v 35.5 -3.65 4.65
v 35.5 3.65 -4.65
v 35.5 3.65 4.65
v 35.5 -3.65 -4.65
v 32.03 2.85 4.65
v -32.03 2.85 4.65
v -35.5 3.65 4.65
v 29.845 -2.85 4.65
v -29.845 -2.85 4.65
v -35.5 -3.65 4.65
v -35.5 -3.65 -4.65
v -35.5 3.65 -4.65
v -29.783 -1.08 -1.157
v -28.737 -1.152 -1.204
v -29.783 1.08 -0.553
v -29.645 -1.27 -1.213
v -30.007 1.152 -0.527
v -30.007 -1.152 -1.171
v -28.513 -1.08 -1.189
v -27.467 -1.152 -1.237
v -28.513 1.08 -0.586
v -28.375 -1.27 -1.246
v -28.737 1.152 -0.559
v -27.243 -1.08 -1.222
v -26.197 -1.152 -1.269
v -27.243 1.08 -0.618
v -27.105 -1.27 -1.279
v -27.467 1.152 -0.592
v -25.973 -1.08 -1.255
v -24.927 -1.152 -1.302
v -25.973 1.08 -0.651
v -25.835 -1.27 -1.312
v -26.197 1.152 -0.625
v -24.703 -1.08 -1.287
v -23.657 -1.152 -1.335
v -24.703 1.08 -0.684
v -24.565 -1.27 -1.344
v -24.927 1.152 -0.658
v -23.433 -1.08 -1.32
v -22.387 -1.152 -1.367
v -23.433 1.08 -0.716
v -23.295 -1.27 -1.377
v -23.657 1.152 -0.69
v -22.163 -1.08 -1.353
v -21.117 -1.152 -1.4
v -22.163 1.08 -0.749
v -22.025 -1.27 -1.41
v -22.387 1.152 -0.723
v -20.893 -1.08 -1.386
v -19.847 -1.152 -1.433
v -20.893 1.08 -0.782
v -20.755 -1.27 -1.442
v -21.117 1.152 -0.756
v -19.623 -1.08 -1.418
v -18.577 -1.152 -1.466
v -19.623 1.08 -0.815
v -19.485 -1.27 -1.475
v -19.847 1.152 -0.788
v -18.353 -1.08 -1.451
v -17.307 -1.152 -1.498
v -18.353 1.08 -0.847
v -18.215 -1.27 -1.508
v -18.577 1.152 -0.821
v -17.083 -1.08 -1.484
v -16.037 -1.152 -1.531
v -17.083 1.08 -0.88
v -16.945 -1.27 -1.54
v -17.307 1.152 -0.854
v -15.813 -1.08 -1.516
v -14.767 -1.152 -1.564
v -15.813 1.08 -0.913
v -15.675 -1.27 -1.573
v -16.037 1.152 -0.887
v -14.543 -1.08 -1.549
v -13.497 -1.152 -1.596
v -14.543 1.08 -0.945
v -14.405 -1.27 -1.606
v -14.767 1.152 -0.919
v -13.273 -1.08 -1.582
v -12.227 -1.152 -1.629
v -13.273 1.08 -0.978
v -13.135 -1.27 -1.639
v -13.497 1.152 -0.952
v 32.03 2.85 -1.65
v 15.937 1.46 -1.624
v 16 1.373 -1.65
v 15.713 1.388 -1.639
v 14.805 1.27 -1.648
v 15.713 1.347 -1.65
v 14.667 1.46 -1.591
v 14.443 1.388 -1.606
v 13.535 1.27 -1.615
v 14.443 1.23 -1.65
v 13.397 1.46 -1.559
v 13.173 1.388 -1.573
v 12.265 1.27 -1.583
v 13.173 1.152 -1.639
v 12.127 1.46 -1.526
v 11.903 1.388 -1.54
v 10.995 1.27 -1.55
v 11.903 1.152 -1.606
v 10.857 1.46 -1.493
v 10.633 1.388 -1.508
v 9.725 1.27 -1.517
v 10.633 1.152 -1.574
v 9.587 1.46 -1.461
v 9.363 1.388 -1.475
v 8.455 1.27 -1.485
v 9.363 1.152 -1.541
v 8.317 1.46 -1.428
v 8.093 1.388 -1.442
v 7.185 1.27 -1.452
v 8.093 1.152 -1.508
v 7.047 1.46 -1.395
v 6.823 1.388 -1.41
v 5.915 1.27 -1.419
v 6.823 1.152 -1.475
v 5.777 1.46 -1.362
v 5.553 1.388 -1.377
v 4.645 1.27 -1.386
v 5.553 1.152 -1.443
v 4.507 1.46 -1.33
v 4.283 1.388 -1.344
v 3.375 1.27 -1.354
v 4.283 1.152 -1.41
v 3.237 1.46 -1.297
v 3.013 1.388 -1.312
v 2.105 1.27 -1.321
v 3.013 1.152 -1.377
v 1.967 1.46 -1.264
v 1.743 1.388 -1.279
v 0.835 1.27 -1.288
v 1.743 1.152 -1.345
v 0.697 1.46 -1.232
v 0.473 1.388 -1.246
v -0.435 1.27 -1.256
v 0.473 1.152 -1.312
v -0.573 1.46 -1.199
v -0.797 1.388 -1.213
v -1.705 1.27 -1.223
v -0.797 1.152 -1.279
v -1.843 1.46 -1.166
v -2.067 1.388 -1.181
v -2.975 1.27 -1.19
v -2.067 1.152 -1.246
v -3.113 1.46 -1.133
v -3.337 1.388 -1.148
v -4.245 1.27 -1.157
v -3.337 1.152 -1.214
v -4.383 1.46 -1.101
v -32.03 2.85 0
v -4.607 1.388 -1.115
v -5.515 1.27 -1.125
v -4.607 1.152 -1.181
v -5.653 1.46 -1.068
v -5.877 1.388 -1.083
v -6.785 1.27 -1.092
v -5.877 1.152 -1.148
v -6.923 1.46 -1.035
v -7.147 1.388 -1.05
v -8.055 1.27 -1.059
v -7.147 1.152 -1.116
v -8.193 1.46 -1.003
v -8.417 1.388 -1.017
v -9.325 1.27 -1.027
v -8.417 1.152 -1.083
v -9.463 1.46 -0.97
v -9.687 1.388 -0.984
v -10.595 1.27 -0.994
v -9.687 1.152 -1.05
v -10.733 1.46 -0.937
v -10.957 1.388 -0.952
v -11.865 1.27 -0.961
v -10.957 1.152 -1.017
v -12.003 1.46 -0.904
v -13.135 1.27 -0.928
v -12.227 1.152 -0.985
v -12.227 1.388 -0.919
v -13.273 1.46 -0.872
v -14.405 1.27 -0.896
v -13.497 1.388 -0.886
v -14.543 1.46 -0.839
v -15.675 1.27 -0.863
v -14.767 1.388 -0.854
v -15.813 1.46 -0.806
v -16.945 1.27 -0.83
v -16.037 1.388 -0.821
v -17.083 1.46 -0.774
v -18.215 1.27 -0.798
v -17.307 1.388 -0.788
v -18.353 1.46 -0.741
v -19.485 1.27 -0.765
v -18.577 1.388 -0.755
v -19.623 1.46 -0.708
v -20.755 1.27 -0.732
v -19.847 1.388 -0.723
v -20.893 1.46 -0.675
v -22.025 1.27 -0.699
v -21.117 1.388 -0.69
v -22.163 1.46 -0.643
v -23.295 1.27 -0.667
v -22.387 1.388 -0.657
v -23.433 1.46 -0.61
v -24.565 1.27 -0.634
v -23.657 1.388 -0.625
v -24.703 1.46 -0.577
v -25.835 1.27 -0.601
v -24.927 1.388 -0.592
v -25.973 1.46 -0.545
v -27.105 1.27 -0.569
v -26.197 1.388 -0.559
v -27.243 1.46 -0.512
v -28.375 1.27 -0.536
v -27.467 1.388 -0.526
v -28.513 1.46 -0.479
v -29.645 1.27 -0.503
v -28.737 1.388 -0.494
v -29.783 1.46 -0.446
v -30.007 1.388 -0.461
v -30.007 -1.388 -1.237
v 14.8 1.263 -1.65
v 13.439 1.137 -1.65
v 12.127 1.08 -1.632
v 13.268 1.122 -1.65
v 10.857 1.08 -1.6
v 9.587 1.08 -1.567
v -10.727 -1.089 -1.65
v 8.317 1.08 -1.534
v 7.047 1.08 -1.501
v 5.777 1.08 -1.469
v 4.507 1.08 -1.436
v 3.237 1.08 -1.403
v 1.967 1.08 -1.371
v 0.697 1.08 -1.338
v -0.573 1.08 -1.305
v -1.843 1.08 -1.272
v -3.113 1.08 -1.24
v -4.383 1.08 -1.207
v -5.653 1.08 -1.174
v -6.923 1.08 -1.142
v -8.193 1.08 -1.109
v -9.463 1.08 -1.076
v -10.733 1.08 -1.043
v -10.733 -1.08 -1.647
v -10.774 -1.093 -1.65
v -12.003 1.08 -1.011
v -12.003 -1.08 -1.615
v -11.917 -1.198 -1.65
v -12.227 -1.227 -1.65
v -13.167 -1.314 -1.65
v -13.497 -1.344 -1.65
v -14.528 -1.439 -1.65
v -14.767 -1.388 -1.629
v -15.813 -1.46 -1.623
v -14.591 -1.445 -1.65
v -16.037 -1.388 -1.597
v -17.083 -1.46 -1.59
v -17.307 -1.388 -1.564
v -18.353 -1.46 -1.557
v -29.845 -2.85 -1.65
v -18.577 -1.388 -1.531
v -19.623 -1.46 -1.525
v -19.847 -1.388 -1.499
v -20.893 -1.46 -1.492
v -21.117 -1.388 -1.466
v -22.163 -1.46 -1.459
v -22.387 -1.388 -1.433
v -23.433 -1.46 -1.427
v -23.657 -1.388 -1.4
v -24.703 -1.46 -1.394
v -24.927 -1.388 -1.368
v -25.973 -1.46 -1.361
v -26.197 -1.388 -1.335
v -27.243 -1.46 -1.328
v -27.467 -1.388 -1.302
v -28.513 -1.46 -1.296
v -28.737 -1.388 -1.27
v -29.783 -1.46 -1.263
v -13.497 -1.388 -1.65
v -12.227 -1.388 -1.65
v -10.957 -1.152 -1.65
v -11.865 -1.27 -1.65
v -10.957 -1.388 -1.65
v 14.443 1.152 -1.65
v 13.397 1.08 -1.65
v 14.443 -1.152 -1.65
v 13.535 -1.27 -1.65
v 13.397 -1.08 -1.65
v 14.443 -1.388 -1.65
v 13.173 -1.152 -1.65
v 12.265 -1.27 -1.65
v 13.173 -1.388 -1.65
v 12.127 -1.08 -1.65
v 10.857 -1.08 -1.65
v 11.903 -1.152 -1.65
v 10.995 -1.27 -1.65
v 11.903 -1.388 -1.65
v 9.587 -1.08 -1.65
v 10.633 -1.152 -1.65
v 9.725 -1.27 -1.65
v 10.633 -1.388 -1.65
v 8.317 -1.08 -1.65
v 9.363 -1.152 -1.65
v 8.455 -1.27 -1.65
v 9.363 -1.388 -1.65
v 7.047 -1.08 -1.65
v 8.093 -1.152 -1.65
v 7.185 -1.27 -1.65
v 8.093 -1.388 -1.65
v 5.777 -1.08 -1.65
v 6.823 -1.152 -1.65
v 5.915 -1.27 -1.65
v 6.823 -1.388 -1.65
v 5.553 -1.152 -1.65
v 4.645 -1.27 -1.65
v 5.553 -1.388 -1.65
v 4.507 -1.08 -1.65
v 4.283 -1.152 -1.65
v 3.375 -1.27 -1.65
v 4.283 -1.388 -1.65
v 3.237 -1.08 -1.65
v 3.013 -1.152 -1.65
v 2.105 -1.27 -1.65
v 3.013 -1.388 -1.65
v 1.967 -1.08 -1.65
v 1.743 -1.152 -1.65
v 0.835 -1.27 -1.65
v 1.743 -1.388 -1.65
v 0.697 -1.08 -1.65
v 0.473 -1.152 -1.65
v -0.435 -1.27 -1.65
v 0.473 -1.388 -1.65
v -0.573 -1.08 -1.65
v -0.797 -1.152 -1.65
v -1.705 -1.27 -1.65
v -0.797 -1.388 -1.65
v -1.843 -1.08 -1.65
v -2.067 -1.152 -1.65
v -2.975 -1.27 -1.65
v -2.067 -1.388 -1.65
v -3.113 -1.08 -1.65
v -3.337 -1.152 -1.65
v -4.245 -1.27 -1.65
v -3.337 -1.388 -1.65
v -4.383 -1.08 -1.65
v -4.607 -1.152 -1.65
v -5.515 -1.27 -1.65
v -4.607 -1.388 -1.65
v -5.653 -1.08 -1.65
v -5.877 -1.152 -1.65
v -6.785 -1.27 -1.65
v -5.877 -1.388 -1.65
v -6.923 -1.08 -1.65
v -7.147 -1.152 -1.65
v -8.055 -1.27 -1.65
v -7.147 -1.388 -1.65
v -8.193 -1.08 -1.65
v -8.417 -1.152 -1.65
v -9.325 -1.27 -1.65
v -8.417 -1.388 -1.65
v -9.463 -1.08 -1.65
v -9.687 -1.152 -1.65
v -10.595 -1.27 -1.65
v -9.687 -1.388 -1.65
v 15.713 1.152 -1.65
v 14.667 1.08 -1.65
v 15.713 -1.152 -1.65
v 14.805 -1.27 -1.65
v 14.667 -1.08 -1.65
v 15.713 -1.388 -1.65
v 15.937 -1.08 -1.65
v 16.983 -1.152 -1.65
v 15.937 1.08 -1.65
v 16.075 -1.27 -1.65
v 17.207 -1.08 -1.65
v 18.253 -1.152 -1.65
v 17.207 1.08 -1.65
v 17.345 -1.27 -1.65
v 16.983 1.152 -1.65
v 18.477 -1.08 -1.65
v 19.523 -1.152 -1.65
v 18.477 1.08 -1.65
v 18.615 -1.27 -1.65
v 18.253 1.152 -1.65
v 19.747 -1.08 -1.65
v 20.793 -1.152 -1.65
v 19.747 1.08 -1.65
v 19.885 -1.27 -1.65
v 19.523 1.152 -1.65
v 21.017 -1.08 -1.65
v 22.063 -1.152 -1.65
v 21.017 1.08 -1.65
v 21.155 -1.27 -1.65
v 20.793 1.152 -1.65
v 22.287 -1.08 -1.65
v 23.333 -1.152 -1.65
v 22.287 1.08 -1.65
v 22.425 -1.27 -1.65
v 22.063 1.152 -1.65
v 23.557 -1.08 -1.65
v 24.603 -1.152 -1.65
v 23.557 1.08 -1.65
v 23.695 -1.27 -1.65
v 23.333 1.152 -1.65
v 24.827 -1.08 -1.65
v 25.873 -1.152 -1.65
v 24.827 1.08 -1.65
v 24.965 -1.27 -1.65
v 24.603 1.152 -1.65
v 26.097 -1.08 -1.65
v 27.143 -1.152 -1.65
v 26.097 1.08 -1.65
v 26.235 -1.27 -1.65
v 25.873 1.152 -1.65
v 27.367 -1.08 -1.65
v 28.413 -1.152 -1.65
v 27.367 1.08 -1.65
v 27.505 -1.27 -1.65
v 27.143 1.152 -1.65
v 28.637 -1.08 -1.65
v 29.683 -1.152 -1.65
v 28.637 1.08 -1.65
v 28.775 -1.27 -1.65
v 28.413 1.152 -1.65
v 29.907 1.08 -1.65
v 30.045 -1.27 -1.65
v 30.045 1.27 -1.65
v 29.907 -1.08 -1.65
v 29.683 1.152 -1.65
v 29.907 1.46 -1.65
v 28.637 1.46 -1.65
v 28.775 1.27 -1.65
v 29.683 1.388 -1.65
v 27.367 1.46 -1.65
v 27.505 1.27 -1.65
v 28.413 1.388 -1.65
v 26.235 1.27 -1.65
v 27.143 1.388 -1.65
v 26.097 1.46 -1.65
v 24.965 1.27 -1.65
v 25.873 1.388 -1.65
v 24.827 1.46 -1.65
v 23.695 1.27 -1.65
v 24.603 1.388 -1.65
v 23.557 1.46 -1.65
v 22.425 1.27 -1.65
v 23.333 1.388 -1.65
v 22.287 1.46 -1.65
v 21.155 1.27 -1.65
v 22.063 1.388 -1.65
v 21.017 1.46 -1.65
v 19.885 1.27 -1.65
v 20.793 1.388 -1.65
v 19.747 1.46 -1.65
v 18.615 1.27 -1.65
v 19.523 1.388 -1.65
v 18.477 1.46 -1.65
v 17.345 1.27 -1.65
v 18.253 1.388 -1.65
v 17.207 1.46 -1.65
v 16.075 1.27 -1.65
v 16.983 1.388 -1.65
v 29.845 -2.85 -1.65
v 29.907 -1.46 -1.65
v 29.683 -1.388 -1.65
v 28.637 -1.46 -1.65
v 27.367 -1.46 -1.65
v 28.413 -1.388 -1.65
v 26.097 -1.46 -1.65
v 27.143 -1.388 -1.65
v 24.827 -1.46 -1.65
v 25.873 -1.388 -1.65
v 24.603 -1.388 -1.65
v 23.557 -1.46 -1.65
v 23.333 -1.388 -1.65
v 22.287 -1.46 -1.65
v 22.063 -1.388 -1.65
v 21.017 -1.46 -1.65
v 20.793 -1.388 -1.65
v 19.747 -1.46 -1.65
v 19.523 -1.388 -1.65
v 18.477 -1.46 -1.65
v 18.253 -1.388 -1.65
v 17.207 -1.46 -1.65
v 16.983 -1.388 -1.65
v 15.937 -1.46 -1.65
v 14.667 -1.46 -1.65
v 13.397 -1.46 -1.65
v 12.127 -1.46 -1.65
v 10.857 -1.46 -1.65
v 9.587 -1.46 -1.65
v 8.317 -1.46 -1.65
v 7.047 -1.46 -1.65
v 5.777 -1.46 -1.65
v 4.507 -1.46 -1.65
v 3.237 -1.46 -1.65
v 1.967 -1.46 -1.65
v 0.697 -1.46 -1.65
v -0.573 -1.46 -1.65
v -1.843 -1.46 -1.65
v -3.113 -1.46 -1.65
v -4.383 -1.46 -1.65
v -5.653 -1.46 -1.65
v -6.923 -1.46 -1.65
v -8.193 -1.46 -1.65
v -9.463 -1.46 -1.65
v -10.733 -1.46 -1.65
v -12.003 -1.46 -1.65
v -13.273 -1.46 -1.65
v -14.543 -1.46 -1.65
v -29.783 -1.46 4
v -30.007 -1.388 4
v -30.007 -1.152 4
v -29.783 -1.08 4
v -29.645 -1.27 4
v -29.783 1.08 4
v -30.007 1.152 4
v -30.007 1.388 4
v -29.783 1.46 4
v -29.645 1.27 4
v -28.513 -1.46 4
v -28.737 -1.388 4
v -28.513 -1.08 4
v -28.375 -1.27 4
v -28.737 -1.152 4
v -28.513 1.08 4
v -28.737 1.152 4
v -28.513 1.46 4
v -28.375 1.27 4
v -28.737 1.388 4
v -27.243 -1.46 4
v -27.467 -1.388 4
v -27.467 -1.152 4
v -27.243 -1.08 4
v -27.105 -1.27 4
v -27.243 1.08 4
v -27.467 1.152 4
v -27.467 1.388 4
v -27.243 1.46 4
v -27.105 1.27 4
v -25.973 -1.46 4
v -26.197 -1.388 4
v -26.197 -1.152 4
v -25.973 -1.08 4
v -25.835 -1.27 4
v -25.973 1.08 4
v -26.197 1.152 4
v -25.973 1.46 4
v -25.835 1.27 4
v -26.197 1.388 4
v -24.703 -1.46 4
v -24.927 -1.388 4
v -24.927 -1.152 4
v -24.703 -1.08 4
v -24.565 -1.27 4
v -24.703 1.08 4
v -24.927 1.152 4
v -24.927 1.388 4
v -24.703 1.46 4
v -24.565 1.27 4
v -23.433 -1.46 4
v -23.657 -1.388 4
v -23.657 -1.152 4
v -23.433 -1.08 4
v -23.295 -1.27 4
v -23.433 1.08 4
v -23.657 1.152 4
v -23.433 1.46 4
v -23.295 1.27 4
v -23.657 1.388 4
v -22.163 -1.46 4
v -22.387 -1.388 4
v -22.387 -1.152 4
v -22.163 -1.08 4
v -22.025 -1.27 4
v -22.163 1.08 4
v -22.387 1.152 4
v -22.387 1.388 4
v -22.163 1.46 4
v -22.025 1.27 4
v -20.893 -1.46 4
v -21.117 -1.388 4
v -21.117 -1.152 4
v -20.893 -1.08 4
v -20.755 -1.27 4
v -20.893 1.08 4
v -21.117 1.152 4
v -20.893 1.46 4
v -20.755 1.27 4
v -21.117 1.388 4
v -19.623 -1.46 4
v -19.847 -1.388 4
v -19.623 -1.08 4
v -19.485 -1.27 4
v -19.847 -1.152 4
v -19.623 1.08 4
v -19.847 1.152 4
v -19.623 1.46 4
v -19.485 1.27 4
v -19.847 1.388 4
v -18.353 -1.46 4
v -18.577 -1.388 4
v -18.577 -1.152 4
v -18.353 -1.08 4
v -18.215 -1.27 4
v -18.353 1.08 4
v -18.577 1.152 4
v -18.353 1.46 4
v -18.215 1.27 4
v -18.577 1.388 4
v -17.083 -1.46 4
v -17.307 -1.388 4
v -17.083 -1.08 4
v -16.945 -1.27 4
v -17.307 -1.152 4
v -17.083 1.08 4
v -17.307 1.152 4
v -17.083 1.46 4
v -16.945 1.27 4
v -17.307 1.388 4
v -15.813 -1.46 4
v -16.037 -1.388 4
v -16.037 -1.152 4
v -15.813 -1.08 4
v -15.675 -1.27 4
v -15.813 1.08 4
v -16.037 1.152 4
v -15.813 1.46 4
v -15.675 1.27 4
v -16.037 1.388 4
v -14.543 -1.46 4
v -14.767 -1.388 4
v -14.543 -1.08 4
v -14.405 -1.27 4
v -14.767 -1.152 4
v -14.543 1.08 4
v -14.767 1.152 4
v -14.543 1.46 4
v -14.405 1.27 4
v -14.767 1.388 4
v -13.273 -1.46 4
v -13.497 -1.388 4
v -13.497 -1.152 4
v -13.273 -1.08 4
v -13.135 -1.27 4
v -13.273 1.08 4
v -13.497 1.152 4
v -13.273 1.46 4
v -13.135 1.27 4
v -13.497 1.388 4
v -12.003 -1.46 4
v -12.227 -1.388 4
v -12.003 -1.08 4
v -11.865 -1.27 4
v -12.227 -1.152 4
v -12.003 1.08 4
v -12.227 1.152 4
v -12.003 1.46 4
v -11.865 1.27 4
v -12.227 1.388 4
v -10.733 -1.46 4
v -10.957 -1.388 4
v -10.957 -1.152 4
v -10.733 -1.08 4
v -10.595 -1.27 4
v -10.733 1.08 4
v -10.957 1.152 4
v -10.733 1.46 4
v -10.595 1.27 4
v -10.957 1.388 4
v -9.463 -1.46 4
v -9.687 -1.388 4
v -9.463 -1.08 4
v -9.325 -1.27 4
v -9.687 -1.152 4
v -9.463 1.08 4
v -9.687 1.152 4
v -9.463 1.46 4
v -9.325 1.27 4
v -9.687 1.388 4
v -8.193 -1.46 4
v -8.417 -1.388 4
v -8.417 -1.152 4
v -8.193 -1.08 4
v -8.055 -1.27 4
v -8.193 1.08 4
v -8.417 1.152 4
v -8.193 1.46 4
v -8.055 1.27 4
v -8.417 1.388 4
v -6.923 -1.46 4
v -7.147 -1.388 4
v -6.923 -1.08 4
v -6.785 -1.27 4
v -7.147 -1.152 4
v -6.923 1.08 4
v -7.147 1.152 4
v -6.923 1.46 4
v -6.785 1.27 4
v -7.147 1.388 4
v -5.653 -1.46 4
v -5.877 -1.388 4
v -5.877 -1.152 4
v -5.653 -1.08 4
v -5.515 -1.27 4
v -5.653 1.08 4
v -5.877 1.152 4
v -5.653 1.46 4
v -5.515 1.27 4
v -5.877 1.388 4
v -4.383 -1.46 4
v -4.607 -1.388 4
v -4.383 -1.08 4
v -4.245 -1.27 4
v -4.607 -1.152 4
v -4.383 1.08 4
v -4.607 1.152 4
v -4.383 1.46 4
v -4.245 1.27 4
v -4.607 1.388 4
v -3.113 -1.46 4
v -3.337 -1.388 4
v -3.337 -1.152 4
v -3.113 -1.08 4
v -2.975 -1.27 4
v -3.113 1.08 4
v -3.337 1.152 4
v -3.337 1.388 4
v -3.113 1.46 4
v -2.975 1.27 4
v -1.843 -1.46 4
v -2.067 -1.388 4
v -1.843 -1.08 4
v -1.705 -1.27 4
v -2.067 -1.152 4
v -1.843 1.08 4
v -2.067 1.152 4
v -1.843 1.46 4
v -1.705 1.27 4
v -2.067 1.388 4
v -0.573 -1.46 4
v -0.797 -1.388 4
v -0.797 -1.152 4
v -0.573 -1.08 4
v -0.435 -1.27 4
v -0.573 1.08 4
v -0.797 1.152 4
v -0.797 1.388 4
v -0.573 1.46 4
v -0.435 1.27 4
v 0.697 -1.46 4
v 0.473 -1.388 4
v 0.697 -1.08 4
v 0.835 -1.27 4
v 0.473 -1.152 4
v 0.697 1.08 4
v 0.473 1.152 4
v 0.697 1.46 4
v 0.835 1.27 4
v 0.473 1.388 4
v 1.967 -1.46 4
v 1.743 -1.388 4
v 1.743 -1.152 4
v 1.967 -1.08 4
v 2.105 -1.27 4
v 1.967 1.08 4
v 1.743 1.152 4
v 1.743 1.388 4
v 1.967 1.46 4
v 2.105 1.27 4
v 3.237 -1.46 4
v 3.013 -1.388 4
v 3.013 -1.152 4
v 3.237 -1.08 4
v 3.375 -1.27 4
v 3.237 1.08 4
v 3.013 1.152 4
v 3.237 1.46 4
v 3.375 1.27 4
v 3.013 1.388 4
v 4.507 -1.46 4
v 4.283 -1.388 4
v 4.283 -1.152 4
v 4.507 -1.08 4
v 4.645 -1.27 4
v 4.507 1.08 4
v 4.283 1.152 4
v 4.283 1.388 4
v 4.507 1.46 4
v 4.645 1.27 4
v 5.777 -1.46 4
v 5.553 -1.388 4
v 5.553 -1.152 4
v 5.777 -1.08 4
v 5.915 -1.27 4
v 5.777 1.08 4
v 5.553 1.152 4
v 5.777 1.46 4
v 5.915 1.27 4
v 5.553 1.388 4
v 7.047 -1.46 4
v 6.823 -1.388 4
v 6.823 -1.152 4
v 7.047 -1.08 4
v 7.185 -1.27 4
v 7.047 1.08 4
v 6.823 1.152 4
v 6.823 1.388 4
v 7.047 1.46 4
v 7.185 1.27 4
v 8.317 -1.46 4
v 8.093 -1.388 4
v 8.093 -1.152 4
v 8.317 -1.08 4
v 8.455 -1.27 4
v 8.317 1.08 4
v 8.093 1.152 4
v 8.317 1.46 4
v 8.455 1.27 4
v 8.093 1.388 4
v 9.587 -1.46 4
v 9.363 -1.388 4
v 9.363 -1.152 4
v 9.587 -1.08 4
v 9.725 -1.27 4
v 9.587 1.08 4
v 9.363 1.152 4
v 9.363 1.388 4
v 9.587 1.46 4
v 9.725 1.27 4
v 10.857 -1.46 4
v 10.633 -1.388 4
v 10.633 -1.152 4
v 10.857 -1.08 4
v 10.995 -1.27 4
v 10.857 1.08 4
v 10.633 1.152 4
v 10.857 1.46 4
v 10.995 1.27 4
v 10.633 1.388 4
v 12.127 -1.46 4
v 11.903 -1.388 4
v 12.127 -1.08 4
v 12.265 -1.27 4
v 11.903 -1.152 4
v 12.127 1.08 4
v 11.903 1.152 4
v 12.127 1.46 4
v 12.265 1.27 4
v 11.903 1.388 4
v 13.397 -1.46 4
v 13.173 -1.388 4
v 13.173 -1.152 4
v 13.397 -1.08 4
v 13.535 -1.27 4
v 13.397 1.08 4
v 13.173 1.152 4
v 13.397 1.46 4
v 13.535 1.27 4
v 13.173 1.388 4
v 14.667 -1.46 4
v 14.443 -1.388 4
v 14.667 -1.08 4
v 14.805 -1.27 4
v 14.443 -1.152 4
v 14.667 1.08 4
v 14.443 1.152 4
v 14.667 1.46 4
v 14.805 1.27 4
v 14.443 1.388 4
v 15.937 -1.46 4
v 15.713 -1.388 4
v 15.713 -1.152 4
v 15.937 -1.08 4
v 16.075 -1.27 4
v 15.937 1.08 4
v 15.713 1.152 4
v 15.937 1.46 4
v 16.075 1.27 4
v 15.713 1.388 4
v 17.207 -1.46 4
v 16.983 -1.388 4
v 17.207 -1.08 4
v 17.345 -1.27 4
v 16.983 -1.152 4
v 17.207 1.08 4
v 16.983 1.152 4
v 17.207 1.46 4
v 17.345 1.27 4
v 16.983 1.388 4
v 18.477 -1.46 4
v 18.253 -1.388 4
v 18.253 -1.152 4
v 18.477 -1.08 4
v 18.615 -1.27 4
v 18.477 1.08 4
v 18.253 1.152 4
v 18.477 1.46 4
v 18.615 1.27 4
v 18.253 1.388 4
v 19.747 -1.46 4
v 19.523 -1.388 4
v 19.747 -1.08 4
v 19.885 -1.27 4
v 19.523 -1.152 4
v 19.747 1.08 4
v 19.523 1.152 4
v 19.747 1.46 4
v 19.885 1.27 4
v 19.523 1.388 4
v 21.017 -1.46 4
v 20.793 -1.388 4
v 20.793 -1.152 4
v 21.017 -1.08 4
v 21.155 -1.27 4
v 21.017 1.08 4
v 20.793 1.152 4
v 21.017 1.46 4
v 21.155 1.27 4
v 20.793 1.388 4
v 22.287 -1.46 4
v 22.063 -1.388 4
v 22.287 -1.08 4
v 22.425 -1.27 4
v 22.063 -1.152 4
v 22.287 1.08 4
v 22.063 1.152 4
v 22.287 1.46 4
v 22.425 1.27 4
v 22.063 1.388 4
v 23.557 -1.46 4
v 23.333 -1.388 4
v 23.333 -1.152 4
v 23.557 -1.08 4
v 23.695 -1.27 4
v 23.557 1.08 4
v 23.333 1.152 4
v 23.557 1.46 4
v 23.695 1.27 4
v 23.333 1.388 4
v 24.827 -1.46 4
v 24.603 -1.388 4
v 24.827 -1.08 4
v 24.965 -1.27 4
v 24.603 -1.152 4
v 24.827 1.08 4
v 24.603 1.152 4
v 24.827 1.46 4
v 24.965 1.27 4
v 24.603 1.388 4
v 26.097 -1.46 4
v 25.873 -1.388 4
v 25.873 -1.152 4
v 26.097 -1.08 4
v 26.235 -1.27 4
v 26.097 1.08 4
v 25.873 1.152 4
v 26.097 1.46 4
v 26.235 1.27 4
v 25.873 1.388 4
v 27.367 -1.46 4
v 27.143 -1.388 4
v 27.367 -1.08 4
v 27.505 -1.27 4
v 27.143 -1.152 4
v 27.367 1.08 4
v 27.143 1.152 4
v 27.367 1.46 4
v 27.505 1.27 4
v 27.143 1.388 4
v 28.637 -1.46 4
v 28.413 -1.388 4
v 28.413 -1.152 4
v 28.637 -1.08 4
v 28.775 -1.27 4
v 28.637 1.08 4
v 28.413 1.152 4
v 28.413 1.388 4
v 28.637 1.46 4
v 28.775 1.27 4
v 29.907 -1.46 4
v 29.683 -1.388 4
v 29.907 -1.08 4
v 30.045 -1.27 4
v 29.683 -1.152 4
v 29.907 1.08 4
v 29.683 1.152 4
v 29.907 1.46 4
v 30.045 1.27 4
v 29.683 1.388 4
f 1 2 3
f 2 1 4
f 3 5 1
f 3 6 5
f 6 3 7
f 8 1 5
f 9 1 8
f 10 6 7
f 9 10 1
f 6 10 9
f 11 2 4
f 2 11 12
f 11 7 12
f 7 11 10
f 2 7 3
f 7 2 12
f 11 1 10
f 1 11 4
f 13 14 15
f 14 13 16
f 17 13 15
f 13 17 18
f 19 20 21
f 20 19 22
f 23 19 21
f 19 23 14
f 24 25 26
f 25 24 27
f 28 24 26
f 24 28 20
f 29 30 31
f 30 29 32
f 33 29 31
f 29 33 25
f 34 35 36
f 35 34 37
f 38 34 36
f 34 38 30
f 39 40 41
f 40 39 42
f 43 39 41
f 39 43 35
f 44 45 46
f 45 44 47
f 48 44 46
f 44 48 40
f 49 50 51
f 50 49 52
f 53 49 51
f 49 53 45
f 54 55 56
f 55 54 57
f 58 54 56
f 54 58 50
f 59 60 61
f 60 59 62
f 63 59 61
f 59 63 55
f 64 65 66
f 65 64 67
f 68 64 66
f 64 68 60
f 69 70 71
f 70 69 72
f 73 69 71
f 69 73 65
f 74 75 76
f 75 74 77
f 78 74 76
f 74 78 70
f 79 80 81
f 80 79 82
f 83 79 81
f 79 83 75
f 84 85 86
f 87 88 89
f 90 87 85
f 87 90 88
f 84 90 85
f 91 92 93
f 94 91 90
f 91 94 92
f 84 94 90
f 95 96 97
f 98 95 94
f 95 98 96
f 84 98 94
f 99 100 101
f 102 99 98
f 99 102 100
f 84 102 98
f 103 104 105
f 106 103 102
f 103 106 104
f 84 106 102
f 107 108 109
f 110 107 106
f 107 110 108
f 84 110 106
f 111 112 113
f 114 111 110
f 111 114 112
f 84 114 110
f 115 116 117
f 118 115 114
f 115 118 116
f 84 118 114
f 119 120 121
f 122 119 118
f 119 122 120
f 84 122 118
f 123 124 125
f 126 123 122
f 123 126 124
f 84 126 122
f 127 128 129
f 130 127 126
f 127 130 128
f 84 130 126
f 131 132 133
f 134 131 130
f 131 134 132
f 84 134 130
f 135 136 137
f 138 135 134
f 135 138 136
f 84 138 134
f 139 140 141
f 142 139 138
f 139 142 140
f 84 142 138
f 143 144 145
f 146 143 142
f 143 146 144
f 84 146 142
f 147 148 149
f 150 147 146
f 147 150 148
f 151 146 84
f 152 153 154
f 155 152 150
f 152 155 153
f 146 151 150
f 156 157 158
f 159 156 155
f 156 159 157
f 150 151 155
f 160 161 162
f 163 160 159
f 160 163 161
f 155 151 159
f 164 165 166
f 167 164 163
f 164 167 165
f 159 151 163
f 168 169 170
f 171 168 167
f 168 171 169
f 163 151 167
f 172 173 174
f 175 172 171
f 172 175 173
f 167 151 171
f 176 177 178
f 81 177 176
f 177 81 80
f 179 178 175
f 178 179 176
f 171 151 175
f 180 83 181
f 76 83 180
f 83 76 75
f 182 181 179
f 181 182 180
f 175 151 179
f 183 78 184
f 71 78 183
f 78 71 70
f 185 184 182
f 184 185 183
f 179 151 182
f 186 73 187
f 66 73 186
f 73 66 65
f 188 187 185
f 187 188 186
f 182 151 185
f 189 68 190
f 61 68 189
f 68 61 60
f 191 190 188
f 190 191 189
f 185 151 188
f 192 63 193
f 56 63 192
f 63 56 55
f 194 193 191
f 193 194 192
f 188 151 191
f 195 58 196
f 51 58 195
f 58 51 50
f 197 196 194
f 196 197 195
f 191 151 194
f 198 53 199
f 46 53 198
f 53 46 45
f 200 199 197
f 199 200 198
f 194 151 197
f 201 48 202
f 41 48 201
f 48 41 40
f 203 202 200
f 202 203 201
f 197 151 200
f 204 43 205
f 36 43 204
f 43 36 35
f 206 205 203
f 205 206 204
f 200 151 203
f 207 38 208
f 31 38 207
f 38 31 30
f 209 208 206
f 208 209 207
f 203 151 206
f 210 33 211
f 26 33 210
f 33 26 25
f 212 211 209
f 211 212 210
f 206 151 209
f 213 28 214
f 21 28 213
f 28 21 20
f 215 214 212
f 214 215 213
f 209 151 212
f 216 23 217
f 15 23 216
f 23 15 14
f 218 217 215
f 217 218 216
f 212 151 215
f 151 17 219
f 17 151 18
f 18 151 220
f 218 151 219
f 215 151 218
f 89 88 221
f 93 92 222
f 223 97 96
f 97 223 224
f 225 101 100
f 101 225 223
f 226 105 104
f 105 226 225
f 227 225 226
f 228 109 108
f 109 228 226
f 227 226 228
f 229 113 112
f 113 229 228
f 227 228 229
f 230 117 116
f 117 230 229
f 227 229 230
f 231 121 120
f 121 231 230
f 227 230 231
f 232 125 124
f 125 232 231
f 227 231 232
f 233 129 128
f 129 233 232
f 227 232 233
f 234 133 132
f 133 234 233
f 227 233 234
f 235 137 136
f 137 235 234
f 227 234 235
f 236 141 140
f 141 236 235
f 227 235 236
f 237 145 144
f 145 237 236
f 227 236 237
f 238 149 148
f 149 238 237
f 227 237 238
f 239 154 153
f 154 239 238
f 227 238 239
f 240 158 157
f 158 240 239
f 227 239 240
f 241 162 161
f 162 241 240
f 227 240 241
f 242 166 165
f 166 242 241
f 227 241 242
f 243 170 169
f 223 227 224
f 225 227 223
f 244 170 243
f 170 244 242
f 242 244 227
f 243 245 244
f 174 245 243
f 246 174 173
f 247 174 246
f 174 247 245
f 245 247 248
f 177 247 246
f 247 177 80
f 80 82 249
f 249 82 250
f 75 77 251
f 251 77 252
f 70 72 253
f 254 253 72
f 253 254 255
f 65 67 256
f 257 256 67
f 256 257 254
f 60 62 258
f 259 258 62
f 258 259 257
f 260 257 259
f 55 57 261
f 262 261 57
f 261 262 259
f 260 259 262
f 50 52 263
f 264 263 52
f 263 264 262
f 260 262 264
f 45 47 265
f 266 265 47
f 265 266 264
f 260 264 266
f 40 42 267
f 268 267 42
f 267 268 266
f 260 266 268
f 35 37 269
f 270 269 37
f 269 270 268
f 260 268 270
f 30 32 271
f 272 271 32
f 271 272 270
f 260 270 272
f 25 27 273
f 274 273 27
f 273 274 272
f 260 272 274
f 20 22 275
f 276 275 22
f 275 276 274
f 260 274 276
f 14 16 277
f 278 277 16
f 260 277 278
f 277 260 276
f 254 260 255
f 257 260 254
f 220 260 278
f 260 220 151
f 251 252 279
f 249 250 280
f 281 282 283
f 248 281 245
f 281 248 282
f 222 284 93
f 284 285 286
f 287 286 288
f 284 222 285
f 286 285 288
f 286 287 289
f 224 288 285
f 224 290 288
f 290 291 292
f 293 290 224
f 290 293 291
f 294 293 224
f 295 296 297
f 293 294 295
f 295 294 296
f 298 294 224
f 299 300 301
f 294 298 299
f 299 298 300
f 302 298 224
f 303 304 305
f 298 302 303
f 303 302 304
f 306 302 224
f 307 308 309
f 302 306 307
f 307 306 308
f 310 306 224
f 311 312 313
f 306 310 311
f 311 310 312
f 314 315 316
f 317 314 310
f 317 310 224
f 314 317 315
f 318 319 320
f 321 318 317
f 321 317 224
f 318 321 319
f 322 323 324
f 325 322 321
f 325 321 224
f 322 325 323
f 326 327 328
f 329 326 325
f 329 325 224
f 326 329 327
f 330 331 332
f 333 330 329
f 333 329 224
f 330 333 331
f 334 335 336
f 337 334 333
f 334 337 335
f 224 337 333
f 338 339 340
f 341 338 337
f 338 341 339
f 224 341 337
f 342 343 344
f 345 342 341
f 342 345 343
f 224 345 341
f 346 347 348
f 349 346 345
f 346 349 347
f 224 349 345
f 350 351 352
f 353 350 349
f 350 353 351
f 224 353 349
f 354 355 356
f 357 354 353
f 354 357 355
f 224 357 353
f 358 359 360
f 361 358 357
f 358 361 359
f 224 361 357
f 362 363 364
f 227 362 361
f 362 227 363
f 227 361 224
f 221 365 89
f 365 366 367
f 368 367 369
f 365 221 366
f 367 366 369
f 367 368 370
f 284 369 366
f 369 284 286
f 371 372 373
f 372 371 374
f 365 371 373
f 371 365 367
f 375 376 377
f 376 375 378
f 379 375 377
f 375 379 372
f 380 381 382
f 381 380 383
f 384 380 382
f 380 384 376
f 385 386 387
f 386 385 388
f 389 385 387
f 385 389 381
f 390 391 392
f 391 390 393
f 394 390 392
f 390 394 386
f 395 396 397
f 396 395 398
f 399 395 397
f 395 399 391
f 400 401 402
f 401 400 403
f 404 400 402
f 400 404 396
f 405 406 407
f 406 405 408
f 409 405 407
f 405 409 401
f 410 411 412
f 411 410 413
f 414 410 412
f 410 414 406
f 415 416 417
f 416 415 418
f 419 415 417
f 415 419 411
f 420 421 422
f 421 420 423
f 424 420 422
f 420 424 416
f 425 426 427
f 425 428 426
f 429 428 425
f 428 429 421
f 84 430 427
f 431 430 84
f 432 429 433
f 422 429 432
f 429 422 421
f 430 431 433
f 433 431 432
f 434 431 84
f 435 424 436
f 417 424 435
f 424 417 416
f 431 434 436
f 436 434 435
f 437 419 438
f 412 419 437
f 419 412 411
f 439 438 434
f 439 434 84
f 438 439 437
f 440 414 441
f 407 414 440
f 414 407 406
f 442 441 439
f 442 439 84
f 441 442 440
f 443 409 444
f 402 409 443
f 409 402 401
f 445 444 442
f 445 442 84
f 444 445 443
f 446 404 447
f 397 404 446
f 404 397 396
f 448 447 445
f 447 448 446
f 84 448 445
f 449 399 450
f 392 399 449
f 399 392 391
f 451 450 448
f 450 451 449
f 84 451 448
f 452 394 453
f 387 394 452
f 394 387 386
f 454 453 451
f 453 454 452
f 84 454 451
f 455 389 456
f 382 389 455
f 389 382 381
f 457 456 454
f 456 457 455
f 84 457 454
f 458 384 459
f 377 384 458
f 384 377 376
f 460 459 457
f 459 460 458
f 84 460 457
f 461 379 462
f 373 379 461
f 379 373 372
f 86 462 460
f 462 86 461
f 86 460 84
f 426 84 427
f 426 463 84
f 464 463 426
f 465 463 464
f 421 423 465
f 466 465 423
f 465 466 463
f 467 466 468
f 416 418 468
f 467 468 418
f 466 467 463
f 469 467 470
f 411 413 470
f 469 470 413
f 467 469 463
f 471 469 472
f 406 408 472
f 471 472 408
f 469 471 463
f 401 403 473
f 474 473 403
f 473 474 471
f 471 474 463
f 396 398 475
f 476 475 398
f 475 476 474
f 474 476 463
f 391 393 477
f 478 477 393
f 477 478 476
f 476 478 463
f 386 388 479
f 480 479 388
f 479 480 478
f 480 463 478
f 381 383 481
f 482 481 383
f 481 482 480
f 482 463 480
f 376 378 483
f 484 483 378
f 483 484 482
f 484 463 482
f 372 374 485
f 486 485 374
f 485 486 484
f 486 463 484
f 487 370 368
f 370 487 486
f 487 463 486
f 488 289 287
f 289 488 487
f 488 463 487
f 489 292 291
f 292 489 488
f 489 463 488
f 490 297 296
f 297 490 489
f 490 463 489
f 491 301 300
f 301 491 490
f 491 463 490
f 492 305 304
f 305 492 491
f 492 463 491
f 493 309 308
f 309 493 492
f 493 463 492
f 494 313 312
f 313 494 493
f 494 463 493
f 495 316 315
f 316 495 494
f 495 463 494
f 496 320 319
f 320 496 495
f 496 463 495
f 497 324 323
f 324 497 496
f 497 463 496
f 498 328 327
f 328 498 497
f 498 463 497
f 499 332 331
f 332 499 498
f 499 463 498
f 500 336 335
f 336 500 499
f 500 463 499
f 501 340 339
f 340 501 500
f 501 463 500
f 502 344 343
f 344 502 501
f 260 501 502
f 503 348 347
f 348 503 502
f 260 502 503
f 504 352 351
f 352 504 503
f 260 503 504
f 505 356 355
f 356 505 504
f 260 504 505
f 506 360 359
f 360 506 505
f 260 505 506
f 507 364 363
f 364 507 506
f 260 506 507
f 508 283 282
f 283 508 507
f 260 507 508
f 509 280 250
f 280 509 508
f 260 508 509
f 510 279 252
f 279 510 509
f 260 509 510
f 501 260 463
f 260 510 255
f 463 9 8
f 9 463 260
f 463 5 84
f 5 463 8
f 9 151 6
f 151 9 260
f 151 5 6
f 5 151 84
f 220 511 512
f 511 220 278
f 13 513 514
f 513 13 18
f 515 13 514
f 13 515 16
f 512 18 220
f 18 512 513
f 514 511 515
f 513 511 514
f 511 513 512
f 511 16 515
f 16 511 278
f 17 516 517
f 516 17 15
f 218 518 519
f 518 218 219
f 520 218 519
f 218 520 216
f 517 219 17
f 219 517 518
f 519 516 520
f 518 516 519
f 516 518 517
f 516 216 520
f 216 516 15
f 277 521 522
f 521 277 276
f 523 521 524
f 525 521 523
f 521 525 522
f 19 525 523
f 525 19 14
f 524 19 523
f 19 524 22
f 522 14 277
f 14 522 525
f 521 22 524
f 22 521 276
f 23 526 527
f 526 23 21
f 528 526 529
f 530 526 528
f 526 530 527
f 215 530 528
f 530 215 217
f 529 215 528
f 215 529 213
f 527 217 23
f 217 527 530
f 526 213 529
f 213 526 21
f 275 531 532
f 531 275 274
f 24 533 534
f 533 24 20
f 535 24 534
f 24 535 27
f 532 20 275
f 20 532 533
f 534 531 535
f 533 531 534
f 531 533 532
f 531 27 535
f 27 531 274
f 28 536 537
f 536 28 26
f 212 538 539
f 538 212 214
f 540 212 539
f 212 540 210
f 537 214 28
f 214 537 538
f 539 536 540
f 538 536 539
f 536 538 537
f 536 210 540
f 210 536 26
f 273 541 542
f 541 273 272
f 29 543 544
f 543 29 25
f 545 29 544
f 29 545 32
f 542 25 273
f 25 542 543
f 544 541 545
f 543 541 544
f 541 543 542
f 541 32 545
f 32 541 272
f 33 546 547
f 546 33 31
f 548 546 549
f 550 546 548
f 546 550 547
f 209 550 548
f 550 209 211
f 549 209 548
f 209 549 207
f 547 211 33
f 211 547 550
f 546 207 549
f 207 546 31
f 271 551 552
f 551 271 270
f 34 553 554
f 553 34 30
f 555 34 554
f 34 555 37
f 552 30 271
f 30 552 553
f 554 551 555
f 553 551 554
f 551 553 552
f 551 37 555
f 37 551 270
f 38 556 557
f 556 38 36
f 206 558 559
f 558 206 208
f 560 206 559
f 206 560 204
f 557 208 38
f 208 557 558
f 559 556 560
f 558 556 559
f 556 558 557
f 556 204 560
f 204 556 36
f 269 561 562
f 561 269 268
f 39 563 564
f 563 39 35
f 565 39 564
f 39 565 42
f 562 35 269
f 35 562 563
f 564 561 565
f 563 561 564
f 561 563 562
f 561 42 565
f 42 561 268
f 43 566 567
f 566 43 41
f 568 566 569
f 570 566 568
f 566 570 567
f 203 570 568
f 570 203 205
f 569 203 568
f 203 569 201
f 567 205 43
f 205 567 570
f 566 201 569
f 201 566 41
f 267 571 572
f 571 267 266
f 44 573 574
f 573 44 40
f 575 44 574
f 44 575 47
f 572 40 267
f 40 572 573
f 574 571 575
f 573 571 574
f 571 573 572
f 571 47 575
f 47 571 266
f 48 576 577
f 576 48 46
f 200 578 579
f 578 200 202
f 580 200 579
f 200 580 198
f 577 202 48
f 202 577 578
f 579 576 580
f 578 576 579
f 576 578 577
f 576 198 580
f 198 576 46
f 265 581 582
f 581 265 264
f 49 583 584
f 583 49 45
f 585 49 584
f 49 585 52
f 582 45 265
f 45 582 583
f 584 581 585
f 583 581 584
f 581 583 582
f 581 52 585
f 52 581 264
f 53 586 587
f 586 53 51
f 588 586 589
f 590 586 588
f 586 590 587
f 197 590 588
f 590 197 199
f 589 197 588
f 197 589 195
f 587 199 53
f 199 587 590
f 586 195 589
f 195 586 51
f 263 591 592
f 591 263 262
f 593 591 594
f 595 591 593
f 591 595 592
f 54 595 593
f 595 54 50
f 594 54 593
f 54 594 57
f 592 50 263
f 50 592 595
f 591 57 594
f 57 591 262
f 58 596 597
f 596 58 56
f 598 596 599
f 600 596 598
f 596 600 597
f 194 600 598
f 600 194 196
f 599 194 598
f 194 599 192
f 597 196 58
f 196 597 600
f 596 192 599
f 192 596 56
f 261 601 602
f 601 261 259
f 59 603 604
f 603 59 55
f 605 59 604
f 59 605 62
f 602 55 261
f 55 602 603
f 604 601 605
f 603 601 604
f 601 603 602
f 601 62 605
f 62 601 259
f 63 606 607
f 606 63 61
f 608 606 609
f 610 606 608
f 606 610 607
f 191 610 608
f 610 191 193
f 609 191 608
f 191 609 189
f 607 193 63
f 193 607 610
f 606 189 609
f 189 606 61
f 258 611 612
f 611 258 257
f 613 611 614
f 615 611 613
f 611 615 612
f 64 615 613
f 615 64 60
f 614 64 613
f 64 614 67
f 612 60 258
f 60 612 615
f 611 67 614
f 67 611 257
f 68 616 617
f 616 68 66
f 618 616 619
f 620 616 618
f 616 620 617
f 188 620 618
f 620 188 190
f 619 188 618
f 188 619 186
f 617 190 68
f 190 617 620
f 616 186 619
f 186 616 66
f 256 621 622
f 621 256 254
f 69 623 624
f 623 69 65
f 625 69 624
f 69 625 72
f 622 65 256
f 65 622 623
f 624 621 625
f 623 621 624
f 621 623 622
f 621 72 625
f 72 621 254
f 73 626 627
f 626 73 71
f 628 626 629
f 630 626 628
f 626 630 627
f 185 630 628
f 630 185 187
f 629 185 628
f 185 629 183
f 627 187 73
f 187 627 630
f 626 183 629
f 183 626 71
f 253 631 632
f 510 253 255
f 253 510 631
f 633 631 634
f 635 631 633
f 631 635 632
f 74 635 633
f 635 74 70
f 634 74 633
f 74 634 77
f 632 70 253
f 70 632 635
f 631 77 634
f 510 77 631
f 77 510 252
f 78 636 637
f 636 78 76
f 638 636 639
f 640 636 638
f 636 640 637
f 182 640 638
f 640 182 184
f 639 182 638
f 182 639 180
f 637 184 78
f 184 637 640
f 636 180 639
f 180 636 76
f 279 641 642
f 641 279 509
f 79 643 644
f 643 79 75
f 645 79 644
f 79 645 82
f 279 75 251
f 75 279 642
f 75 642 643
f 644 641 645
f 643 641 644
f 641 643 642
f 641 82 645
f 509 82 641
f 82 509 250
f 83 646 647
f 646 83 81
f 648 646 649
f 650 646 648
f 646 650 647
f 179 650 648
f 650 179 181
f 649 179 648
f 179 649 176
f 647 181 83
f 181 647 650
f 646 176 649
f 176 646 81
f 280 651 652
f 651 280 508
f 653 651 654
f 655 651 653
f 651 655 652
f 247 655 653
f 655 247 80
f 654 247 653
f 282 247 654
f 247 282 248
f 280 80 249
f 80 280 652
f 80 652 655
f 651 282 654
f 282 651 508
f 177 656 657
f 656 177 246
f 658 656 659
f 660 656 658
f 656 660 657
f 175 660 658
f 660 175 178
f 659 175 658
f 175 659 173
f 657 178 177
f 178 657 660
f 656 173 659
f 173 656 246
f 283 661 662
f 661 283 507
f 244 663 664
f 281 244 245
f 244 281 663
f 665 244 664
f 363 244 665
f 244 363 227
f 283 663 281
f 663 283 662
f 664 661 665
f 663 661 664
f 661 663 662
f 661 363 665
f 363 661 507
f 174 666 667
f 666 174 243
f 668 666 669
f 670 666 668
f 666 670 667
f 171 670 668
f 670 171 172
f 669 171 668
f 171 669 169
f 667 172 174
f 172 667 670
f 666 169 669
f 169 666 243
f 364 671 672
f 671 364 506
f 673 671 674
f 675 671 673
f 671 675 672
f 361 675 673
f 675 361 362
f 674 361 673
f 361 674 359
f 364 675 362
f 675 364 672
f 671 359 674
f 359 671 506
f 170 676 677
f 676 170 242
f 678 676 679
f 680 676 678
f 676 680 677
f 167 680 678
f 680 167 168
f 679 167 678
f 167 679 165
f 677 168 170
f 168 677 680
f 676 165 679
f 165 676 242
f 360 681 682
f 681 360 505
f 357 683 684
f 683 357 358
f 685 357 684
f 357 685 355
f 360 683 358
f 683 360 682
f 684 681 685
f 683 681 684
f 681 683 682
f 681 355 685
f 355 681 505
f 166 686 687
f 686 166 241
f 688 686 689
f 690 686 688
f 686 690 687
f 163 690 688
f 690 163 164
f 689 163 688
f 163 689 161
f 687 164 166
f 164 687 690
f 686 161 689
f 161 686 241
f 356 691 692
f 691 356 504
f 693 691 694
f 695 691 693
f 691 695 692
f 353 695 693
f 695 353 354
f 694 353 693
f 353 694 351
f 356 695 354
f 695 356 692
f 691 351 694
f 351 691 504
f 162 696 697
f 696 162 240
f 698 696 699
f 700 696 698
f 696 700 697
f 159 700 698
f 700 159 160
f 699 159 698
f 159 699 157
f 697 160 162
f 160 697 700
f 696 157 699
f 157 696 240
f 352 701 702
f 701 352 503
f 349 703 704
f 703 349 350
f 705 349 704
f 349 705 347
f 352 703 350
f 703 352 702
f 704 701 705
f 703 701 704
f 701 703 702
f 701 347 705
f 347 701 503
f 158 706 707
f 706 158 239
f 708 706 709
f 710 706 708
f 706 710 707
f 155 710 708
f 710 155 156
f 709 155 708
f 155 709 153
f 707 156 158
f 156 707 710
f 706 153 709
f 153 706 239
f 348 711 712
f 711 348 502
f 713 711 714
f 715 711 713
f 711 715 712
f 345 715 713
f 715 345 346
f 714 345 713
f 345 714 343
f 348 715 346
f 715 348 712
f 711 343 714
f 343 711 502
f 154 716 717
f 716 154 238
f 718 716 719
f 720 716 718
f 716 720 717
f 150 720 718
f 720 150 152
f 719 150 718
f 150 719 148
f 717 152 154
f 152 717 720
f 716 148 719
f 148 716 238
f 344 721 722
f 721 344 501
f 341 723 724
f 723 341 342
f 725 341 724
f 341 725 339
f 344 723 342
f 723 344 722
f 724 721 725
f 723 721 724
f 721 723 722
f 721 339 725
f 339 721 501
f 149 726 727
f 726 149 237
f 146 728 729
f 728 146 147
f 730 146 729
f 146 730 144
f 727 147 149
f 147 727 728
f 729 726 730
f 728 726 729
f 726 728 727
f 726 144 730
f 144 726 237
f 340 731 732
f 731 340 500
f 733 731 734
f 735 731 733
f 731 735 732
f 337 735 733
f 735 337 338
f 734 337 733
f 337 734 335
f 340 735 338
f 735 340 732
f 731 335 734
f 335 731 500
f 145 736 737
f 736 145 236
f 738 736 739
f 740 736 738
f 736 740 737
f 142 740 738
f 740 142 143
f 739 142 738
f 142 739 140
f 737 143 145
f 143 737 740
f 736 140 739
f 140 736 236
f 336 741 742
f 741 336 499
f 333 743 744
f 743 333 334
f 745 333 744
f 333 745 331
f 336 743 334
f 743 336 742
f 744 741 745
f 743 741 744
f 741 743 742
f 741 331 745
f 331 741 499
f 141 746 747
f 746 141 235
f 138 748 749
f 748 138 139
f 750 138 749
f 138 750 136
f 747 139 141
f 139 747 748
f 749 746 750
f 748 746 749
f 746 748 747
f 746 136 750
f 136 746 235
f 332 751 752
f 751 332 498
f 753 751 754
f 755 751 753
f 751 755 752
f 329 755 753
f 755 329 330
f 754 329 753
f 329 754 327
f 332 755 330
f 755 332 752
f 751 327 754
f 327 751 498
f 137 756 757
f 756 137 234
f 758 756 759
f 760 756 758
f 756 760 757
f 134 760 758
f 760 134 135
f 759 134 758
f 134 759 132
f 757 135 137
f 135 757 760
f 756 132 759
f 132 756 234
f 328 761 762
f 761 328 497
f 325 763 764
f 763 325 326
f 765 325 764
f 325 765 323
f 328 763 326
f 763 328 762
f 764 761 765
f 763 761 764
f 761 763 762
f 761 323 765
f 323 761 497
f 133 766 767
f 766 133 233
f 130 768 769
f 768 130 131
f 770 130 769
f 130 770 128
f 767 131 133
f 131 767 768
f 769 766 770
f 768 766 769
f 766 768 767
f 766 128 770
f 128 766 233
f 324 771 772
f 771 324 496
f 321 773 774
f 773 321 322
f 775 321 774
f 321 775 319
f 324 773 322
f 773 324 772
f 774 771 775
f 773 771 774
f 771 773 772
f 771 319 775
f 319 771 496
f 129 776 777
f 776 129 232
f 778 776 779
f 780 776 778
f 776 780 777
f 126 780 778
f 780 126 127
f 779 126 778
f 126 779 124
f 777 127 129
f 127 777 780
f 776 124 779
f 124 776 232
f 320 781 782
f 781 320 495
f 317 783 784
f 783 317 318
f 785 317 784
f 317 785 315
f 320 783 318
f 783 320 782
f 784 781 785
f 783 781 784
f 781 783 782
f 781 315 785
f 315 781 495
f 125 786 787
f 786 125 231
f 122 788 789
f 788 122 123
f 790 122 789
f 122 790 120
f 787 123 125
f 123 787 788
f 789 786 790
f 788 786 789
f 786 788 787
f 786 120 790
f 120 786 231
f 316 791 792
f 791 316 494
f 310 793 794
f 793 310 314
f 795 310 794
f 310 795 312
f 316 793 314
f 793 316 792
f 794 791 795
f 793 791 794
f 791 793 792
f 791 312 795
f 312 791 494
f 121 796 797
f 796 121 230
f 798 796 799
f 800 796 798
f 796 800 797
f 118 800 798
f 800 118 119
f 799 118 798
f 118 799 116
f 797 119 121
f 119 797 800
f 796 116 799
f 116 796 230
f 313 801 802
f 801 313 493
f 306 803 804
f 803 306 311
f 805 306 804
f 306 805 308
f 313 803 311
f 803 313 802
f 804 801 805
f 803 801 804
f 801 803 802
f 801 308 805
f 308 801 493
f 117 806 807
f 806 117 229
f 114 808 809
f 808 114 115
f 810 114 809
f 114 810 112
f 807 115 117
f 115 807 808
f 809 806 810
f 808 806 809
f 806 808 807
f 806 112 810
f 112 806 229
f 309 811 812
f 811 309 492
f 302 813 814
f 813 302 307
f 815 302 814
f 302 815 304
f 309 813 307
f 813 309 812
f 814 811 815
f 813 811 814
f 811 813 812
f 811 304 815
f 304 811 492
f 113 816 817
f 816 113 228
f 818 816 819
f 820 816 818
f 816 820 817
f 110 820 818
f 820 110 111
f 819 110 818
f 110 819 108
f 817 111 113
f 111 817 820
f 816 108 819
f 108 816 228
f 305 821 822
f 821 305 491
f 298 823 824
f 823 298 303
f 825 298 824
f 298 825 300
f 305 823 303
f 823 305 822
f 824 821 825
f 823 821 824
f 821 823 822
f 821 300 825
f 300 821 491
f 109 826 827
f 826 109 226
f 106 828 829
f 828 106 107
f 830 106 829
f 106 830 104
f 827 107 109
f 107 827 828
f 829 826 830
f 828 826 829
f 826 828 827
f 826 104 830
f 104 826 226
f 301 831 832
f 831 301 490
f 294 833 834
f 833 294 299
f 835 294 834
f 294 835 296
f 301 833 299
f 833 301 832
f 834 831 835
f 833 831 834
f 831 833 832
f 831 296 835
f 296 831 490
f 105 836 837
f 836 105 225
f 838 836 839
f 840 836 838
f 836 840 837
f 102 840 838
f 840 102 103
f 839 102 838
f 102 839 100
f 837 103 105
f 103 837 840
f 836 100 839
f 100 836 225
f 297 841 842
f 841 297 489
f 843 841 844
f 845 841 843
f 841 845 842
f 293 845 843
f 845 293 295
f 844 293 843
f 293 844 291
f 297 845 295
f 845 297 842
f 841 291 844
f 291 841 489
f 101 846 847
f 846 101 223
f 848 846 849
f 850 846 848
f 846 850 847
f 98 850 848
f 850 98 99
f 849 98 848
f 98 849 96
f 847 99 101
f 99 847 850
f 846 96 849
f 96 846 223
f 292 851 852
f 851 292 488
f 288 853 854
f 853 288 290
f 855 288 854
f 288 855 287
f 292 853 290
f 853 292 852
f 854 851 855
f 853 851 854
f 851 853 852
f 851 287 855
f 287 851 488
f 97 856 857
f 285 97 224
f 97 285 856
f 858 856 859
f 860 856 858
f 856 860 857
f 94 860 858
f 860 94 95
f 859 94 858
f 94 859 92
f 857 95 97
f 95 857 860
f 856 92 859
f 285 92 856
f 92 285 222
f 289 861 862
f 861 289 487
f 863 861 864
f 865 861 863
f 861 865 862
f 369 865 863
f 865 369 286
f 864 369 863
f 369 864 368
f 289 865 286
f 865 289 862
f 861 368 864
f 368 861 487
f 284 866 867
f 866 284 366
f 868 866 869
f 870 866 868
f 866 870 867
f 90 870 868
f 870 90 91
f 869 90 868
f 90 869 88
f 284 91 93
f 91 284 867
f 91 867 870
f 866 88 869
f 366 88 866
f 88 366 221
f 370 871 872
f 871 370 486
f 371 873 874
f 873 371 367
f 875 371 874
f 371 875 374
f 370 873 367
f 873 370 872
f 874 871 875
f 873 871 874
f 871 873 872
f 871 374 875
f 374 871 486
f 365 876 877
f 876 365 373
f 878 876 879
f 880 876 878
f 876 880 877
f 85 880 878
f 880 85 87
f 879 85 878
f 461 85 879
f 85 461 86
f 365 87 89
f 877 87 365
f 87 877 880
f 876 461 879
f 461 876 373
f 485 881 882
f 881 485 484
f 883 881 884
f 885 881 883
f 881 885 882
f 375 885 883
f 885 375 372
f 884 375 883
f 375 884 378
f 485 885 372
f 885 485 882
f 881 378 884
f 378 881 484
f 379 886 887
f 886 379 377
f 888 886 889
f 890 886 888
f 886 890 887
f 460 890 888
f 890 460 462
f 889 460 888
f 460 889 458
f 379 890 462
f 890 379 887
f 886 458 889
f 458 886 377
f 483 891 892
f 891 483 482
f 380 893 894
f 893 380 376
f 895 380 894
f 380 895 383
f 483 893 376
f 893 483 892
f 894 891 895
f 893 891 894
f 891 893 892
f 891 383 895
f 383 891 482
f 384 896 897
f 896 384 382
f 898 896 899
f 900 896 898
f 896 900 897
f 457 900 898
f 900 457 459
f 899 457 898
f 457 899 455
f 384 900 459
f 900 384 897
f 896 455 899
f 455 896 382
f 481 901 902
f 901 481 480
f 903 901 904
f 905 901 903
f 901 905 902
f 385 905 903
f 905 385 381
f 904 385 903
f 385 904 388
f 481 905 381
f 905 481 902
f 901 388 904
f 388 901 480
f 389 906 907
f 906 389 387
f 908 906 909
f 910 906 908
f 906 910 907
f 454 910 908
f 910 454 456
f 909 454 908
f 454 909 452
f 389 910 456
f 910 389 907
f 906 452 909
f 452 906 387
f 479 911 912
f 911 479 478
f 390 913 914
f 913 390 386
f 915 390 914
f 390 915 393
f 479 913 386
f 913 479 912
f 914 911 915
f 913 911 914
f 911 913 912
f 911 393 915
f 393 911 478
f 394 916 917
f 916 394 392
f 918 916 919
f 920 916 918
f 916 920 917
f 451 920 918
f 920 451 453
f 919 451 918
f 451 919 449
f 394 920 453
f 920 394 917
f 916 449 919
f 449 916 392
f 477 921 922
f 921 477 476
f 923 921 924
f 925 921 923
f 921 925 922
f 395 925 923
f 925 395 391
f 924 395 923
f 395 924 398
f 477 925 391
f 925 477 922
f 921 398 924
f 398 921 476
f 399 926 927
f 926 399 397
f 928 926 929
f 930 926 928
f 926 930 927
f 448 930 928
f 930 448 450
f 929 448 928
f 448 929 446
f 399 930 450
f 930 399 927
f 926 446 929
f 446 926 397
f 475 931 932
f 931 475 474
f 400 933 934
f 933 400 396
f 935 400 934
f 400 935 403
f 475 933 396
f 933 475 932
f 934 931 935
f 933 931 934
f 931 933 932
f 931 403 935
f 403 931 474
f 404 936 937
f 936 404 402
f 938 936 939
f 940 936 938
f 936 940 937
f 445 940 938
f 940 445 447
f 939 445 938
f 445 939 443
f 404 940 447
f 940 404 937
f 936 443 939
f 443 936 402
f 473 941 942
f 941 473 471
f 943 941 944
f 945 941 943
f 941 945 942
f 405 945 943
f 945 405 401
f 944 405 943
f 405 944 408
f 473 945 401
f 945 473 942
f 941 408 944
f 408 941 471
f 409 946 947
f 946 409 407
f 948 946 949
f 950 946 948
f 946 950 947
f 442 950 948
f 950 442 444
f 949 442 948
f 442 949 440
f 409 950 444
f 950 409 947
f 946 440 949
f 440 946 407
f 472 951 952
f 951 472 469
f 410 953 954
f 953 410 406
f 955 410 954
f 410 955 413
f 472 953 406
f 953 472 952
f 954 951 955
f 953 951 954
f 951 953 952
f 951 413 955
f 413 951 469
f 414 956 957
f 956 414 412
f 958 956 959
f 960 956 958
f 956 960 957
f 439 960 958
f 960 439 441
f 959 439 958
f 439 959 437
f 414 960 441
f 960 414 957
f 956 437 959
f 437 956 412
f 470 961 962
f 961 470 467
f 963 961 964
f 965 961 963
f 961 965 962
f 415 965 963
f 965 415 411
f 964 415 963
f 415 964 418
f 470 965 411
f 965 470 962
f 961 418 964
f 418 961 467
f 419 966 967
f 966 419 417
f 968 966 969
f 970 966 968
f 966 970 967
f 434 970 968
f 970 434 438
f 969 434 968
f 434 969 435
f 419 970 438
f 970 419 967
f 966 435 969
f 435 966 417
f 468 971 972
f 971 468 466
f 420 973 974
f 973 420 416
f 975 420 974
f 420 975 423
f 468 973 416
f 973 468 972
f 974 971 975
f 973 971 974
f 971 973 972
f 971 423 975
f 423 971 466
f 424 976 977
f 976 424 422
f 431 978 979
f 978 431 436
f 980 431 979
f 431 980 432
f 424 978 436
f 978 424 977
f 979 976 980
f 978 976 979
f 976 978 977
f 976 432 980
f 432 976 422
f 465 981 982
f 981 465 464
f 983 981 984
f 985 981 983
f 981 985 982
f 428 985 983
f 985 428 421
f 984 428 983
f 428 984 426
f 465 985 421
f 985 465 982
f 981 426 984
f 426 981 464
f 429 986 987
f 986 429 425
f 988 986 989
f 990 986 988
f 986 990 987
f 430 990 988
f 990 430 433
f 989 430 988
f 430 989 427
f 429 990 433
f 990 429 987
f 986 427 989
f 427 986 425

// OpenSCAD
SBUS_A=71.0;
SBUS_B=59.69;
SBUS_C=64.06;
SBUS_HOLE_WIDE=64.06;
SBUS_HOLE_NARROW=59.69;
SBUS_HOLE_WIDTH=5.7;
SBUS_WIDTH=7.3;
SBUS_HEIGHT=9.3;

HolePoints = [
  [ -SBUS_HOLE_NARROW/2, -SBUS_HOLE_WIDTH/2, -SBUS_HEIGHT/2+3 ],  //0
  [ +SBUS_HOLE_NARROW/2, -SBUS_HOLE_WIDTH/2, -SBUS_HEIGHT/2+3 ],  //1
  [ +SBUS_HOLE_WIDE/2, +SBUS_HOLE_WIDTH/2, -SBUS_HEIGHT/2+3 ],  //2
  [ -SBUS_HOLE_WIDE/2, +SBUS_HOLE_WIDTH/2,  ],  //3
  [ -SBUS_HOLE_NARROW/2, -SBUS_HOLE_WIDTH/2,  20 ],  //4
  [ +SBUS_HOLE_NARROW/2, -SBUS_HOLE_WIDTH/2,  20 ],  //5
  [ +SBUS_HOLE_WIDE/2, +SBUS_HOLE_WIDTH/2,  20 ],  //6
  [ -SBUS_HOLE_WIDE/2, +SBUS_HOLE_WIDTH/2,  20 ],  //7
  ]; //7
  
HoleFaces = [
  [0,1,2,3],  // bottom
  [4,5,1,0],  // front
  [7,6,5,4],  // top
  [5,6,2,1],  // right
  [6,7,3,2],  // back
  [7,4,0,3]]; // left

difference() {  
color("black") cube([SBUS_A, SBUS_WIDTH, SBUS_HEIGHT], center=true);
color("black") polyhedron( HolePoints, HoleFaces );
}

for (i = [0 : 47]) {
translate([-SBUS_B/2+i*1.27, -1.27, 0]) {
  color("silver") cylinder(h = 8, r1 = 0.2, r2 = 0.2, center = true);
}
translate([-SBUS_B/2+i*1.27, +1.27, 0]) {
  color("silver") cylinder(h = 8, r1 = 0.2, r2 = 0.2, center = true);
}
}
